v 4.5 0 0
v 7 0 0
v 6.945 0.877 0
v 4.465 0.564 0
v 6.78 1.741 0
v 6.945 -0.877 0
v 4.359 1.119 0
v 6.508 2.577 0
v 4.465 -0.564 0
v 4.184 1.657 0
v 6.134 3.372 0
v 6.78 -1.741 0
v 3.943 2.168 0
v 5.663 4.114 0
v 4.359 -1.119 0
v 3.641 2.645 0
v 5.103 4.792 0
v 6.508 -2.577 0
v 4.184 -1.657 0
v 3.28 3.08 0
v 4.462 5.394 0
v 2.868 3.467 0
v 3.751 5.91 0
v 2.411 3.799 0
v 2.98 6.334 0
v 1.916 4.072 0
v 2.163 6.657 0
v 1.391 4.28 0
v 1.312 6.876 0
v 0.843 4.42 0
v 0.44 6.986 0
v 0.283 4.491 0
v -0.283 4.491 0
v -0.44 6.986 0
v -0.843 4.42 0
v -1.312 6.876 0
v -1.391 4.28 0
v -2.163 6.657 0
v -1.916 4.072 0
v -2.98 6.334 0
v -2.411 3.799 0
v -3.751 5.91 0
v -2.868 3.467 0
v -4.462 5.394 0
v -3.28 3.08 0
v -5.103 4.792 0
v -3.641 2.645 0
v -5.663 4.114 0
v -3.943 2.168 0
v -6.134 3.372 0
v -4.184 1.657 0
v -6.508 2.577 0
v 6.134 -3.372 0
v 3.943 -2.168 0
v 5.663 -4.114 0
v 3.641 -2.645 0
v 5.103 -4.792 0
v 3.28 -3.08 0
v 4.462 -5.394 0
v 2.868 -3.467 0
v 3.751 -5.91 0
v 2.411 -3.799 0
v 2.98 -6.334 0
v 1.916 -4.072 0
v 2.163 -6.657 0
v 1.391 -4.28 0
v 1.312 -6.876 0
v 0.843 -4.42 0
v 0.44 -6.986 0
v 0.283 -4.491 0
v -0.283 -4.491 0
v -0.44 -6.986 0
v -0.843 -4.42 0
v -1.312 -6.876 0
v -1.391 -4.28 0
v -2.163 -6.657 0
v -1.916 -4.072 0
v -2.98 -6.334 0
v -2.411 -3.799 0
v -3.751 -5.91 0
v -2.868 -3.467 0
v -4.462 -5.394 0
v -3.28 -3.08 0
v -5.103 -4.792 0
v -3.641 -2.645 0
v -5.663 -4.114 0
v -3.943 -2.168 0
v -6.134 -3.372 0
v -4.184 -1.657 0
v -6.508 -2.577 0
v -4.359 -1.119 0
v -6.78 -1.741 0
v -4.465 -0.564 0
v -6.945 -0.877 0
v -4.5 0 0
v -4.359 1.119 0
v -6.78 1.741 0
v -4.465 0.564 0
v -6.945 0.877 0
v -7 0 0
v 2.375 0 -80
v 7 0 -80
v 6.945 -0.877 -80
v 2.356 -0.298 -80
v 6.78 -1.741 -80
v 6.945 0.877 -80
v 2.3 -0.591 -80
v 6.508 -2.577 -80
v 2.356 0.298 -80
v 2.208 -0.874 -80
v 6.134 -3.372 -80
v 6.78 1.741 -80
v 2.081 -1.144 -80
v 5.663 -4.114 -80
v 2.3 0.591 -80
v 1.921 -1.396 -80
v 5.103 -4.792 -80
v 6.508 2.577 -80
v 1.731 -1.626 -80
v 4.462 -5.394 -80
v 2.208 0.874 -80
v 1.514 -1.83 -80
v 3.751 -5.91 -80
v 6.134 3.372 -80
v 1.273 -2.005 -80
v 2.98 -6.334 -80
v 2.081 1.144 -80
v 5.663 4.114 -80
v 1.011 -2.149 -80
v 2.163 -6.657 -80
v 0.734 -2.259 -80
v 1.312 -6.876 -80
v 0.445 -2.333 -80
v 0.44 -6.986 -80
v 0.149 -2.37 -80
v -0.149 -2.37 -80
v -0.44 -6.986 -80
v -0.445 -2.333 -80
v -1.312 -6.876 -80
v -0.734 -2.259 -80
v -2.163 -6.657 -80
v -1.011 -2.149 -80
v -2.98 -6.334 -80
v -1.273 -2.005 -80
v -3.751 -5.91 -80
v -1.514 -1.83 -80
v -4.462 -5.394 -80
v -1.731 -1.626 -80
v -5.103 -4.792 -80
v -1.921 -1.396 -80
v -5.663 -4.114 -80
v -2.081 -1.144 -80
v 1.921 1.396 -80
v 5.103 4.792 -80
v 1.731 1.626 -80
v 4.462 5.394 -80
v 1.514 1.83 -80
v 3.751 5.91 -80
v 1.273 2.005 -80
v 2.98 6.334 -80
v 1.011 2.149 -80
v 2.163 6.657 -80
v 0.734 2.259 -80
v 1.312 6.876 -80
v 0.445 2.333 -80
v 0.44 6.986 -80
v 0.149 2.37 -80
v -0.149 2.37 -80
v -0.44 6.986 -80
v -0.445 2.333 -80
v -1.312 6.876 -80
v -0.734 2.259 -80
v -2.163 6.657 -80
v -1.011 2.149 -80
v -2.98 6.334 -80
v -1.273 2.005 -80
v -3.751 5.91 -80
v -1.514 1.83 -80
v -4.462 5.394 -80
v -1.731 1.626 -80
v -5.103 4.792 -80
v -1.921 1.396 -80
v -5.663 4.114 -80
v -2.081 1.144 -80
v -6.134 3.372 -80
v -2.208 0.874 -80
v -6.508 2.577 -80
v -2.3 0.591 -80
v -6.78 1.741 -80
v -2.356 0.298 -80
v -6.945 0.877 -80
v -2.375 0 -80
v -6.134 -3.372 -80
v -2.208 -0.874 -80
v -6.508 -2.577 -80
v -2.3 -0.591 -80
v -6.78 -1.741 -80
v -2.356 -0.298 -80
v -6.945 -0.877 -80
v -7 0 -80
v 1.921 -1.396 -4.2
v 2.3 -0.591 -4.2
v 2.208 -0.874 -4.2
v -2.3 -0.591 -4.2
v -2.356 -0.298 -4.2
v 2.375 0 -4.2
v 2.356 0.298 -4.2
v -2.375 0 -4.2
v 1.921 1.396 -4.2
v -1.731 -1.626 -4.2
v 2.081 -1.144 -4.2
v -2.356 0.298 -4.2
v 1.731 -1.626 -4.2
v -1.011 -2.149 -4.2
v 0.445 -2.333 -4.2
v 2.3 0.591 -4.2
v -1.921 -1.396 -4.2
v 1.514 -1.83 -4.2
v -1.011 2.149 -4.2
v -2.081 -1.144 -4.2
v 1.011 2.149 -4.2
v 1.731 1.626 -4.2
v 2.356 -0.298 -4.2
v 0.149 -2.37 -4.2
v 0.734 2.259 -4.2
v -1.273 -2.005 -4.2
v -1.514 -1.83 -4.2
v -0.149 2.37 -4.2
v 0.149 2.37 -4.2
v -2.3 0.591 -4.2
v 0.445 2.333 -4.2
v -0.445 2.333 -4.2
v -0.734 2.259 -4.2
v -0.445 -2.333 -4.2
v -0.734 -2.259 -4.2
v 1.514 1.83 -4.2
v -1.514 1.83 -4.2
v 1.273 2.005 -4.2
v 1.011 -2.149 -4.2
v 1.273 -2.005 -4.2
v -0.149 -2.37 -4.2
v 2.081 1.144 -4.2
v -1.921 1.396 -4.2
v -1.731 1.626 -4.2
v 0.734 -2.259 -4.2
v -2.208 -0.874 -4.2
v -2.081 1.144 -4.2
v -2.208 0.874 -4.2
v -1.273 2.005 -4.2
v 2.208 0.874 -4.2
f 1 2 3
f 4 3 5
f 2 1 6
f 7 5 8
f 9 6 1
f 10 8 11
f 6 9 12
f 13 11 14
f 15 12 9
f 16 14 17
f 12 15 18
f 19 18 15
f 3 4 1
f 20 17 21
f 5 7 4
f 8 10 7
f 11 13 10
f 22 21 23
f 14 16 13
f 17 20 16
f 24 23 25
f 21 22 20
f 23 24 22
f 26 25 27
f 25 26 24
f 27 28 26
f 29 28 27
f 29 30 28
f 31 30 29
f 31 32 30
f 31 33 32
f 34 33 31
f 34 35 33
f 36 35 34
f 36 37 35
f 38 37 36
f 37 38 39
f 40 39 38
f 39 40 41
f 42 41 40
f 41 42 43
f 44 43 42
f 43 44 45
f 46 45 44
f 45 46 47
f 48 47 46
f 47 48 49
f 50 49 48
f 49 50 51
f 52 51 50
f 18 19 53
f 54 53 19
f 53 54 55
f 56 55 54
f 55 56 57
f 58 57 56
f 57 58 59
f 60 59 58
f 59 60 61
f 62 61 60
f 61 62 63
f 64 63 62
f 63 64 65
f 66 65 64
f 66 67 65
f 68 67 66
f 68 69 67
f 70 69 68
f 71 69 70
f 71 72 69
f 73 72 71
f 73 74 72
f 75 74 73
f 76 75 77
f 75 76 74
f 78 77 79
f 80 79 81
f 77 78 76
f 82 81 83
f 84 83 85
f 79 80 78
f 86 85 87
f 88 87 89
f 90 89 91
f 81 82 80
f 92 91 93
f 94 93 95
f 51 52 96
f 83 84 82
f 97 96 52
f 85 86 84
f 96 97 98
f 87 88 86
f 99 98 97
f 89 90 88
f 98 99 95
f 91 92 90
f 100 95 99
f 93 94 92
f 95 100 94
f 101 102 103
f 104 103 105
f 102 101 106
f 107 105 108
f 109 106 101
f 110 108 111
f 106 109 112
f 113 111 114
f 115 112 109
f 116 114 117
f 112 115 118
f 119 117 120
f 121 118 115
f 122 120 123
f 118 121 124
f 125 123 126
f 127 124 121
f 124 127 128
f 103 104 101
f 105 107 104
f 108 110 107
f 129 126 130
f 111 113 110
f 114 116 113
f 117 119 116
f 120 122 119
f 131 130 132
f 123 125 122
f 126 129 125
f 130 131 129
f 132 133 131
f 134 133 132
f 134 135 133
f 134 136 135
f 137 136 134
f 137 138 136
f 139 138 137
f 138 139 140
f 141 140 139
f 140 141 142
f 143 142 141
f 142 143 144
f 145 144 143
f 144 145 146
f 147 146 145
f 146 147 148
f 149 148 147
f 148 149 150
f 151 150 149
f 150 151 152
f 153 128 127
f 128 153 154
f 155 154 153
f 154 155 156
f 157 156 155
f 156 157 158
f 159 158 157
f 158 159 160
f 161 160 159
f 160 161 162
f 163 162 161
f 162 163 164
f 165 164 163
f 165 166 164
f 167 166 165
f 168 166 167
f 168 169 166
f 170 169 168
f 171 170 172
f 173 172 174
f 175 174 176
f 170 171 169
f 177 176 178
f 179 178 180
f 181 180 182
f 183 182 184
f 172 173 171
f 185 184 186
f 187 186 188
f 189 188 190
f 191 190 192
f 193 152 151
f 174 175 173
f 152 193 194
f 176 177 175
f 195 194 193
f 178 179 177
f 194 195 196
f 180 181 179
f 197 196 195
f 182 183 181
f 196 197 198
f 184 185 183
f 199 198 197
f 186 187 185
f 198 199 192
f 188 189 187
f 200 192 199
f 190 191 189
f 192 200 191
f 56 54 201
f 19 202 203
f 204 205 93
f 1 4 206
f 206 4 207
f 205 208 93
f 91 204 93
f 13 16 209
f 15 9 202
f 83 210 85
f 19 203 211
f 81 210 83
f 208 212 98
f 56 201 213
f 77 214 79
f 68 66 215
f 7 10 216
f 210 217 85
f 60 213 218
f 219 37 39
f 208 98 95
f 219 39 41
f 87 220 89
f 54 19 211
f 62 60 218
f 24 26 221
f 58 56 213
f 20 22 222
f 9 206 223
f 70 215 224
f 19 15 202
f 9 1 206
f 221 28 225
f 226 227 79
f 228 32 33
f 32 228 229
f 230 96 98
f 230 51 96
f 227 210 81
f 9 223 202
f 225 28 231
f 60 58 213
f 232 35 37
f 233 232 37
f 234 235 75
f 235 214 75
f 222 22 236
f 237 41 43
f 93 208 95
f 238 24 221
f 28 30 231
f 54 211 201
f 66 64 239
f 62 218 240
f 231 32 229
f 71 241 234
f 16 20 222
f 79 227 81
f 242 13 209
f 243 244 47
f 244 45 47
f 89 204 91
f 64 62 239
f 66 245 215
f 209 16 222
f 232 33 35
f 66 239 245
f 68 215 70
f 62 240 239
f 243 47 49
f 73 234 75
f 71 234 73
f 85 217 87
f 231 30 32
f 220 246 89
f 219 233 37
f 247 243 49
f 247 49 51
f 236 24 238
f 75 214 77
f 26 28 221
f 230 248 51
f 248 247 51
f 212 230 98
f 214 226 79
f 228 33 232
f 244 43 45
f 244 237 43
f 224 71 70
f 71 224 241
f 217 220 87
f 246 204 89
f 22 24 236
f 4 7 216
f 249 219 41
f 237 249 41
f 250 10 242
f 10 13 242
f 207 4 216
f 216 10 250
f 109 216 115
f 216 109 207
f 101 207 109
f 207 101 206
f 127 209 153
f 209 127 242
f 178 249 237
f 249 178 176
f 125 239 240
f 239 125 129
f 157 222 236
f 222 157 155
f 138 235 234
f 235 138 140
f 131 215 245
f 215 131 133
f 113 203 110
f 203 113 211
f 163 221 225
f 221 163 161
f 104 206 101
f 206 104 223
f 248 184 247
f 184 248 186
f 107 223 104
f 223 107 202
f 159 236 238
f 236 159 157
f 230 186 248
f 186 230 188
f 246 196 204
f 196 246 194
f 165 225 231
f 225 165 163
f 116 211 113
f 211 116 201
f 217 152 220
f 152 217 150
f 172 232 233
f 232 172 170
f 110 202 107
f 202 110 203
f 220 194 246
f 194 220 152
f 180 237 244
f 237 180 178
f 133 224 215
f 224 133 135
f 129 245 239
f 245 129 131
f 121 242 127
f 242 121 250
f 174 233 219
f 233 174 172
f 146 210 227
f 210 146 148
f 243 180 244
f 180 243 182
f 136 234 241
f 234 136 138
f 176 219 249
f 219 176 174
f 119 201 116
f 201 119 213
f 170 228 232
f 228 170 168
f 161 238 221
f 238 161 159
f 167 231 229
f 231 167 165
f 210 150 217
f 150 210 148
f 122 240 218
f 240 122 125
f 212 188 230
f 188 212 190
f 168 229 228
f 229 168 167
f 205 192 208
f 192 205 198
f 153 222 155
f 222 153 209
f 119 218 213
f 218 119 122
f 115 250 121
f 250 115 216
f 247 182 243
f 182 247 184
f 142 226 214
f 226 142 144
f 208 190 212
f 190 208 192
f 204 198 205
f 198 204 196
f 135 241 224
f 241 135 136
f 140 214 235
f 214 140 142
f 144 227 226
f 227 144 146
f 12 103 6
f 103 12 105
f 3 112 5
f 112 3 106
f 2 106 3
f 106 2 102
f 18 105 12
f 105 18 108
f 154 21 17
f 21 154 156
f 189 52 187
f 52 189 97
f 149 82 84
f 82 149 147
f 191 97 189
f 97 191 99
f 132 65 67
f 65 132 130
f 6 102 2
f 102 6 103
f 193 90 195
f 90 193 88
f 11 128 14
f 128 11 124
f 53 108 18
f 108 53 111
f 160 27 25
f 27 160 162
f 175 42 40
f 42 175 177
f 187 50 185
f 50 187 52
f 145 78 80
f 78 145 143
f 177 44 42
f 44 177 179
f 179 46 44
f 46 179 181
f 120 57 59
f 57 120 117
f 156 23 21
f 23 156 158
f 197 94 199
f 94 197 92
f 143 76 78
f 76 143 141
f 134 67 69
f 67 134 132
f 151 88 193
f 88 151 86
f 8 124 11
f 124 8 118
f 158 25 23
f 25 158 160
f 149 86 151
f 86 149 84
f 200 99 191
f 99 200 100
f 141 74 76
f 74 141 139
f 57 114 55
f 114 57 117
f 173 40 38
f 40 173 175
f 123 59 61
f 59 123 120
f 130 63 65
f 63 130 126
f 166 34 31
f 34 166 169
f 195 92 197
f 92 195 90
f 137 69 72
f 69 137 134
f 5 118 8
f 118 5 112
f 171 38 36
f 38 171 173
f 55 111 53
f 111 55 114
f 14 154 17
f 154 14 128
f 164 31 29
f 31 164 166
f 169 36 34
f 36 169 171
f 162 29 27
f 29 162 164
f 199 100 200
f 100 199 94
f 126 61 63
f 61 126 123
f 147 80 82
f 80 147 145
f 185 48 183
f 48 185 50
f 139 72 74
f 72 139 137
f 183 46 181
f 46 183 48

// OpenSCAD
$fn = 50;


difference() {
	union() {
		translate(v = [0, 0, -80.0000000000]) {
			cylinder(h = 80, r = 7.0000000000);
		}
	}
	union() {
		translate(v = [0, 0, 0]) {
			rotate(a = [0, 0, 0]) {
				difference() {
					union() {
						#translate(v = [0, 0, -80.0000000000]) {
							cylinder(h = 80, r = 2.2500000000);
						}
						#translate(v = [0, 0, -4.2000000000]) {
							cylinder(h = 4.2000000000, r = 7.0000000000, r1 = 2.3750000000, r2 = 4.5000000000);
						}
						#translate(v = [0, 0, -80.0000000000]) {
							cylinder(h = 80, r = 2.3750000000);
						}
						#translate(v = [0, 0, -80.0000000000]) {
							cylinder(h = 80, r = 2.2500000000);
						}
					}
					union();
				}
			}
		}
	}
}
